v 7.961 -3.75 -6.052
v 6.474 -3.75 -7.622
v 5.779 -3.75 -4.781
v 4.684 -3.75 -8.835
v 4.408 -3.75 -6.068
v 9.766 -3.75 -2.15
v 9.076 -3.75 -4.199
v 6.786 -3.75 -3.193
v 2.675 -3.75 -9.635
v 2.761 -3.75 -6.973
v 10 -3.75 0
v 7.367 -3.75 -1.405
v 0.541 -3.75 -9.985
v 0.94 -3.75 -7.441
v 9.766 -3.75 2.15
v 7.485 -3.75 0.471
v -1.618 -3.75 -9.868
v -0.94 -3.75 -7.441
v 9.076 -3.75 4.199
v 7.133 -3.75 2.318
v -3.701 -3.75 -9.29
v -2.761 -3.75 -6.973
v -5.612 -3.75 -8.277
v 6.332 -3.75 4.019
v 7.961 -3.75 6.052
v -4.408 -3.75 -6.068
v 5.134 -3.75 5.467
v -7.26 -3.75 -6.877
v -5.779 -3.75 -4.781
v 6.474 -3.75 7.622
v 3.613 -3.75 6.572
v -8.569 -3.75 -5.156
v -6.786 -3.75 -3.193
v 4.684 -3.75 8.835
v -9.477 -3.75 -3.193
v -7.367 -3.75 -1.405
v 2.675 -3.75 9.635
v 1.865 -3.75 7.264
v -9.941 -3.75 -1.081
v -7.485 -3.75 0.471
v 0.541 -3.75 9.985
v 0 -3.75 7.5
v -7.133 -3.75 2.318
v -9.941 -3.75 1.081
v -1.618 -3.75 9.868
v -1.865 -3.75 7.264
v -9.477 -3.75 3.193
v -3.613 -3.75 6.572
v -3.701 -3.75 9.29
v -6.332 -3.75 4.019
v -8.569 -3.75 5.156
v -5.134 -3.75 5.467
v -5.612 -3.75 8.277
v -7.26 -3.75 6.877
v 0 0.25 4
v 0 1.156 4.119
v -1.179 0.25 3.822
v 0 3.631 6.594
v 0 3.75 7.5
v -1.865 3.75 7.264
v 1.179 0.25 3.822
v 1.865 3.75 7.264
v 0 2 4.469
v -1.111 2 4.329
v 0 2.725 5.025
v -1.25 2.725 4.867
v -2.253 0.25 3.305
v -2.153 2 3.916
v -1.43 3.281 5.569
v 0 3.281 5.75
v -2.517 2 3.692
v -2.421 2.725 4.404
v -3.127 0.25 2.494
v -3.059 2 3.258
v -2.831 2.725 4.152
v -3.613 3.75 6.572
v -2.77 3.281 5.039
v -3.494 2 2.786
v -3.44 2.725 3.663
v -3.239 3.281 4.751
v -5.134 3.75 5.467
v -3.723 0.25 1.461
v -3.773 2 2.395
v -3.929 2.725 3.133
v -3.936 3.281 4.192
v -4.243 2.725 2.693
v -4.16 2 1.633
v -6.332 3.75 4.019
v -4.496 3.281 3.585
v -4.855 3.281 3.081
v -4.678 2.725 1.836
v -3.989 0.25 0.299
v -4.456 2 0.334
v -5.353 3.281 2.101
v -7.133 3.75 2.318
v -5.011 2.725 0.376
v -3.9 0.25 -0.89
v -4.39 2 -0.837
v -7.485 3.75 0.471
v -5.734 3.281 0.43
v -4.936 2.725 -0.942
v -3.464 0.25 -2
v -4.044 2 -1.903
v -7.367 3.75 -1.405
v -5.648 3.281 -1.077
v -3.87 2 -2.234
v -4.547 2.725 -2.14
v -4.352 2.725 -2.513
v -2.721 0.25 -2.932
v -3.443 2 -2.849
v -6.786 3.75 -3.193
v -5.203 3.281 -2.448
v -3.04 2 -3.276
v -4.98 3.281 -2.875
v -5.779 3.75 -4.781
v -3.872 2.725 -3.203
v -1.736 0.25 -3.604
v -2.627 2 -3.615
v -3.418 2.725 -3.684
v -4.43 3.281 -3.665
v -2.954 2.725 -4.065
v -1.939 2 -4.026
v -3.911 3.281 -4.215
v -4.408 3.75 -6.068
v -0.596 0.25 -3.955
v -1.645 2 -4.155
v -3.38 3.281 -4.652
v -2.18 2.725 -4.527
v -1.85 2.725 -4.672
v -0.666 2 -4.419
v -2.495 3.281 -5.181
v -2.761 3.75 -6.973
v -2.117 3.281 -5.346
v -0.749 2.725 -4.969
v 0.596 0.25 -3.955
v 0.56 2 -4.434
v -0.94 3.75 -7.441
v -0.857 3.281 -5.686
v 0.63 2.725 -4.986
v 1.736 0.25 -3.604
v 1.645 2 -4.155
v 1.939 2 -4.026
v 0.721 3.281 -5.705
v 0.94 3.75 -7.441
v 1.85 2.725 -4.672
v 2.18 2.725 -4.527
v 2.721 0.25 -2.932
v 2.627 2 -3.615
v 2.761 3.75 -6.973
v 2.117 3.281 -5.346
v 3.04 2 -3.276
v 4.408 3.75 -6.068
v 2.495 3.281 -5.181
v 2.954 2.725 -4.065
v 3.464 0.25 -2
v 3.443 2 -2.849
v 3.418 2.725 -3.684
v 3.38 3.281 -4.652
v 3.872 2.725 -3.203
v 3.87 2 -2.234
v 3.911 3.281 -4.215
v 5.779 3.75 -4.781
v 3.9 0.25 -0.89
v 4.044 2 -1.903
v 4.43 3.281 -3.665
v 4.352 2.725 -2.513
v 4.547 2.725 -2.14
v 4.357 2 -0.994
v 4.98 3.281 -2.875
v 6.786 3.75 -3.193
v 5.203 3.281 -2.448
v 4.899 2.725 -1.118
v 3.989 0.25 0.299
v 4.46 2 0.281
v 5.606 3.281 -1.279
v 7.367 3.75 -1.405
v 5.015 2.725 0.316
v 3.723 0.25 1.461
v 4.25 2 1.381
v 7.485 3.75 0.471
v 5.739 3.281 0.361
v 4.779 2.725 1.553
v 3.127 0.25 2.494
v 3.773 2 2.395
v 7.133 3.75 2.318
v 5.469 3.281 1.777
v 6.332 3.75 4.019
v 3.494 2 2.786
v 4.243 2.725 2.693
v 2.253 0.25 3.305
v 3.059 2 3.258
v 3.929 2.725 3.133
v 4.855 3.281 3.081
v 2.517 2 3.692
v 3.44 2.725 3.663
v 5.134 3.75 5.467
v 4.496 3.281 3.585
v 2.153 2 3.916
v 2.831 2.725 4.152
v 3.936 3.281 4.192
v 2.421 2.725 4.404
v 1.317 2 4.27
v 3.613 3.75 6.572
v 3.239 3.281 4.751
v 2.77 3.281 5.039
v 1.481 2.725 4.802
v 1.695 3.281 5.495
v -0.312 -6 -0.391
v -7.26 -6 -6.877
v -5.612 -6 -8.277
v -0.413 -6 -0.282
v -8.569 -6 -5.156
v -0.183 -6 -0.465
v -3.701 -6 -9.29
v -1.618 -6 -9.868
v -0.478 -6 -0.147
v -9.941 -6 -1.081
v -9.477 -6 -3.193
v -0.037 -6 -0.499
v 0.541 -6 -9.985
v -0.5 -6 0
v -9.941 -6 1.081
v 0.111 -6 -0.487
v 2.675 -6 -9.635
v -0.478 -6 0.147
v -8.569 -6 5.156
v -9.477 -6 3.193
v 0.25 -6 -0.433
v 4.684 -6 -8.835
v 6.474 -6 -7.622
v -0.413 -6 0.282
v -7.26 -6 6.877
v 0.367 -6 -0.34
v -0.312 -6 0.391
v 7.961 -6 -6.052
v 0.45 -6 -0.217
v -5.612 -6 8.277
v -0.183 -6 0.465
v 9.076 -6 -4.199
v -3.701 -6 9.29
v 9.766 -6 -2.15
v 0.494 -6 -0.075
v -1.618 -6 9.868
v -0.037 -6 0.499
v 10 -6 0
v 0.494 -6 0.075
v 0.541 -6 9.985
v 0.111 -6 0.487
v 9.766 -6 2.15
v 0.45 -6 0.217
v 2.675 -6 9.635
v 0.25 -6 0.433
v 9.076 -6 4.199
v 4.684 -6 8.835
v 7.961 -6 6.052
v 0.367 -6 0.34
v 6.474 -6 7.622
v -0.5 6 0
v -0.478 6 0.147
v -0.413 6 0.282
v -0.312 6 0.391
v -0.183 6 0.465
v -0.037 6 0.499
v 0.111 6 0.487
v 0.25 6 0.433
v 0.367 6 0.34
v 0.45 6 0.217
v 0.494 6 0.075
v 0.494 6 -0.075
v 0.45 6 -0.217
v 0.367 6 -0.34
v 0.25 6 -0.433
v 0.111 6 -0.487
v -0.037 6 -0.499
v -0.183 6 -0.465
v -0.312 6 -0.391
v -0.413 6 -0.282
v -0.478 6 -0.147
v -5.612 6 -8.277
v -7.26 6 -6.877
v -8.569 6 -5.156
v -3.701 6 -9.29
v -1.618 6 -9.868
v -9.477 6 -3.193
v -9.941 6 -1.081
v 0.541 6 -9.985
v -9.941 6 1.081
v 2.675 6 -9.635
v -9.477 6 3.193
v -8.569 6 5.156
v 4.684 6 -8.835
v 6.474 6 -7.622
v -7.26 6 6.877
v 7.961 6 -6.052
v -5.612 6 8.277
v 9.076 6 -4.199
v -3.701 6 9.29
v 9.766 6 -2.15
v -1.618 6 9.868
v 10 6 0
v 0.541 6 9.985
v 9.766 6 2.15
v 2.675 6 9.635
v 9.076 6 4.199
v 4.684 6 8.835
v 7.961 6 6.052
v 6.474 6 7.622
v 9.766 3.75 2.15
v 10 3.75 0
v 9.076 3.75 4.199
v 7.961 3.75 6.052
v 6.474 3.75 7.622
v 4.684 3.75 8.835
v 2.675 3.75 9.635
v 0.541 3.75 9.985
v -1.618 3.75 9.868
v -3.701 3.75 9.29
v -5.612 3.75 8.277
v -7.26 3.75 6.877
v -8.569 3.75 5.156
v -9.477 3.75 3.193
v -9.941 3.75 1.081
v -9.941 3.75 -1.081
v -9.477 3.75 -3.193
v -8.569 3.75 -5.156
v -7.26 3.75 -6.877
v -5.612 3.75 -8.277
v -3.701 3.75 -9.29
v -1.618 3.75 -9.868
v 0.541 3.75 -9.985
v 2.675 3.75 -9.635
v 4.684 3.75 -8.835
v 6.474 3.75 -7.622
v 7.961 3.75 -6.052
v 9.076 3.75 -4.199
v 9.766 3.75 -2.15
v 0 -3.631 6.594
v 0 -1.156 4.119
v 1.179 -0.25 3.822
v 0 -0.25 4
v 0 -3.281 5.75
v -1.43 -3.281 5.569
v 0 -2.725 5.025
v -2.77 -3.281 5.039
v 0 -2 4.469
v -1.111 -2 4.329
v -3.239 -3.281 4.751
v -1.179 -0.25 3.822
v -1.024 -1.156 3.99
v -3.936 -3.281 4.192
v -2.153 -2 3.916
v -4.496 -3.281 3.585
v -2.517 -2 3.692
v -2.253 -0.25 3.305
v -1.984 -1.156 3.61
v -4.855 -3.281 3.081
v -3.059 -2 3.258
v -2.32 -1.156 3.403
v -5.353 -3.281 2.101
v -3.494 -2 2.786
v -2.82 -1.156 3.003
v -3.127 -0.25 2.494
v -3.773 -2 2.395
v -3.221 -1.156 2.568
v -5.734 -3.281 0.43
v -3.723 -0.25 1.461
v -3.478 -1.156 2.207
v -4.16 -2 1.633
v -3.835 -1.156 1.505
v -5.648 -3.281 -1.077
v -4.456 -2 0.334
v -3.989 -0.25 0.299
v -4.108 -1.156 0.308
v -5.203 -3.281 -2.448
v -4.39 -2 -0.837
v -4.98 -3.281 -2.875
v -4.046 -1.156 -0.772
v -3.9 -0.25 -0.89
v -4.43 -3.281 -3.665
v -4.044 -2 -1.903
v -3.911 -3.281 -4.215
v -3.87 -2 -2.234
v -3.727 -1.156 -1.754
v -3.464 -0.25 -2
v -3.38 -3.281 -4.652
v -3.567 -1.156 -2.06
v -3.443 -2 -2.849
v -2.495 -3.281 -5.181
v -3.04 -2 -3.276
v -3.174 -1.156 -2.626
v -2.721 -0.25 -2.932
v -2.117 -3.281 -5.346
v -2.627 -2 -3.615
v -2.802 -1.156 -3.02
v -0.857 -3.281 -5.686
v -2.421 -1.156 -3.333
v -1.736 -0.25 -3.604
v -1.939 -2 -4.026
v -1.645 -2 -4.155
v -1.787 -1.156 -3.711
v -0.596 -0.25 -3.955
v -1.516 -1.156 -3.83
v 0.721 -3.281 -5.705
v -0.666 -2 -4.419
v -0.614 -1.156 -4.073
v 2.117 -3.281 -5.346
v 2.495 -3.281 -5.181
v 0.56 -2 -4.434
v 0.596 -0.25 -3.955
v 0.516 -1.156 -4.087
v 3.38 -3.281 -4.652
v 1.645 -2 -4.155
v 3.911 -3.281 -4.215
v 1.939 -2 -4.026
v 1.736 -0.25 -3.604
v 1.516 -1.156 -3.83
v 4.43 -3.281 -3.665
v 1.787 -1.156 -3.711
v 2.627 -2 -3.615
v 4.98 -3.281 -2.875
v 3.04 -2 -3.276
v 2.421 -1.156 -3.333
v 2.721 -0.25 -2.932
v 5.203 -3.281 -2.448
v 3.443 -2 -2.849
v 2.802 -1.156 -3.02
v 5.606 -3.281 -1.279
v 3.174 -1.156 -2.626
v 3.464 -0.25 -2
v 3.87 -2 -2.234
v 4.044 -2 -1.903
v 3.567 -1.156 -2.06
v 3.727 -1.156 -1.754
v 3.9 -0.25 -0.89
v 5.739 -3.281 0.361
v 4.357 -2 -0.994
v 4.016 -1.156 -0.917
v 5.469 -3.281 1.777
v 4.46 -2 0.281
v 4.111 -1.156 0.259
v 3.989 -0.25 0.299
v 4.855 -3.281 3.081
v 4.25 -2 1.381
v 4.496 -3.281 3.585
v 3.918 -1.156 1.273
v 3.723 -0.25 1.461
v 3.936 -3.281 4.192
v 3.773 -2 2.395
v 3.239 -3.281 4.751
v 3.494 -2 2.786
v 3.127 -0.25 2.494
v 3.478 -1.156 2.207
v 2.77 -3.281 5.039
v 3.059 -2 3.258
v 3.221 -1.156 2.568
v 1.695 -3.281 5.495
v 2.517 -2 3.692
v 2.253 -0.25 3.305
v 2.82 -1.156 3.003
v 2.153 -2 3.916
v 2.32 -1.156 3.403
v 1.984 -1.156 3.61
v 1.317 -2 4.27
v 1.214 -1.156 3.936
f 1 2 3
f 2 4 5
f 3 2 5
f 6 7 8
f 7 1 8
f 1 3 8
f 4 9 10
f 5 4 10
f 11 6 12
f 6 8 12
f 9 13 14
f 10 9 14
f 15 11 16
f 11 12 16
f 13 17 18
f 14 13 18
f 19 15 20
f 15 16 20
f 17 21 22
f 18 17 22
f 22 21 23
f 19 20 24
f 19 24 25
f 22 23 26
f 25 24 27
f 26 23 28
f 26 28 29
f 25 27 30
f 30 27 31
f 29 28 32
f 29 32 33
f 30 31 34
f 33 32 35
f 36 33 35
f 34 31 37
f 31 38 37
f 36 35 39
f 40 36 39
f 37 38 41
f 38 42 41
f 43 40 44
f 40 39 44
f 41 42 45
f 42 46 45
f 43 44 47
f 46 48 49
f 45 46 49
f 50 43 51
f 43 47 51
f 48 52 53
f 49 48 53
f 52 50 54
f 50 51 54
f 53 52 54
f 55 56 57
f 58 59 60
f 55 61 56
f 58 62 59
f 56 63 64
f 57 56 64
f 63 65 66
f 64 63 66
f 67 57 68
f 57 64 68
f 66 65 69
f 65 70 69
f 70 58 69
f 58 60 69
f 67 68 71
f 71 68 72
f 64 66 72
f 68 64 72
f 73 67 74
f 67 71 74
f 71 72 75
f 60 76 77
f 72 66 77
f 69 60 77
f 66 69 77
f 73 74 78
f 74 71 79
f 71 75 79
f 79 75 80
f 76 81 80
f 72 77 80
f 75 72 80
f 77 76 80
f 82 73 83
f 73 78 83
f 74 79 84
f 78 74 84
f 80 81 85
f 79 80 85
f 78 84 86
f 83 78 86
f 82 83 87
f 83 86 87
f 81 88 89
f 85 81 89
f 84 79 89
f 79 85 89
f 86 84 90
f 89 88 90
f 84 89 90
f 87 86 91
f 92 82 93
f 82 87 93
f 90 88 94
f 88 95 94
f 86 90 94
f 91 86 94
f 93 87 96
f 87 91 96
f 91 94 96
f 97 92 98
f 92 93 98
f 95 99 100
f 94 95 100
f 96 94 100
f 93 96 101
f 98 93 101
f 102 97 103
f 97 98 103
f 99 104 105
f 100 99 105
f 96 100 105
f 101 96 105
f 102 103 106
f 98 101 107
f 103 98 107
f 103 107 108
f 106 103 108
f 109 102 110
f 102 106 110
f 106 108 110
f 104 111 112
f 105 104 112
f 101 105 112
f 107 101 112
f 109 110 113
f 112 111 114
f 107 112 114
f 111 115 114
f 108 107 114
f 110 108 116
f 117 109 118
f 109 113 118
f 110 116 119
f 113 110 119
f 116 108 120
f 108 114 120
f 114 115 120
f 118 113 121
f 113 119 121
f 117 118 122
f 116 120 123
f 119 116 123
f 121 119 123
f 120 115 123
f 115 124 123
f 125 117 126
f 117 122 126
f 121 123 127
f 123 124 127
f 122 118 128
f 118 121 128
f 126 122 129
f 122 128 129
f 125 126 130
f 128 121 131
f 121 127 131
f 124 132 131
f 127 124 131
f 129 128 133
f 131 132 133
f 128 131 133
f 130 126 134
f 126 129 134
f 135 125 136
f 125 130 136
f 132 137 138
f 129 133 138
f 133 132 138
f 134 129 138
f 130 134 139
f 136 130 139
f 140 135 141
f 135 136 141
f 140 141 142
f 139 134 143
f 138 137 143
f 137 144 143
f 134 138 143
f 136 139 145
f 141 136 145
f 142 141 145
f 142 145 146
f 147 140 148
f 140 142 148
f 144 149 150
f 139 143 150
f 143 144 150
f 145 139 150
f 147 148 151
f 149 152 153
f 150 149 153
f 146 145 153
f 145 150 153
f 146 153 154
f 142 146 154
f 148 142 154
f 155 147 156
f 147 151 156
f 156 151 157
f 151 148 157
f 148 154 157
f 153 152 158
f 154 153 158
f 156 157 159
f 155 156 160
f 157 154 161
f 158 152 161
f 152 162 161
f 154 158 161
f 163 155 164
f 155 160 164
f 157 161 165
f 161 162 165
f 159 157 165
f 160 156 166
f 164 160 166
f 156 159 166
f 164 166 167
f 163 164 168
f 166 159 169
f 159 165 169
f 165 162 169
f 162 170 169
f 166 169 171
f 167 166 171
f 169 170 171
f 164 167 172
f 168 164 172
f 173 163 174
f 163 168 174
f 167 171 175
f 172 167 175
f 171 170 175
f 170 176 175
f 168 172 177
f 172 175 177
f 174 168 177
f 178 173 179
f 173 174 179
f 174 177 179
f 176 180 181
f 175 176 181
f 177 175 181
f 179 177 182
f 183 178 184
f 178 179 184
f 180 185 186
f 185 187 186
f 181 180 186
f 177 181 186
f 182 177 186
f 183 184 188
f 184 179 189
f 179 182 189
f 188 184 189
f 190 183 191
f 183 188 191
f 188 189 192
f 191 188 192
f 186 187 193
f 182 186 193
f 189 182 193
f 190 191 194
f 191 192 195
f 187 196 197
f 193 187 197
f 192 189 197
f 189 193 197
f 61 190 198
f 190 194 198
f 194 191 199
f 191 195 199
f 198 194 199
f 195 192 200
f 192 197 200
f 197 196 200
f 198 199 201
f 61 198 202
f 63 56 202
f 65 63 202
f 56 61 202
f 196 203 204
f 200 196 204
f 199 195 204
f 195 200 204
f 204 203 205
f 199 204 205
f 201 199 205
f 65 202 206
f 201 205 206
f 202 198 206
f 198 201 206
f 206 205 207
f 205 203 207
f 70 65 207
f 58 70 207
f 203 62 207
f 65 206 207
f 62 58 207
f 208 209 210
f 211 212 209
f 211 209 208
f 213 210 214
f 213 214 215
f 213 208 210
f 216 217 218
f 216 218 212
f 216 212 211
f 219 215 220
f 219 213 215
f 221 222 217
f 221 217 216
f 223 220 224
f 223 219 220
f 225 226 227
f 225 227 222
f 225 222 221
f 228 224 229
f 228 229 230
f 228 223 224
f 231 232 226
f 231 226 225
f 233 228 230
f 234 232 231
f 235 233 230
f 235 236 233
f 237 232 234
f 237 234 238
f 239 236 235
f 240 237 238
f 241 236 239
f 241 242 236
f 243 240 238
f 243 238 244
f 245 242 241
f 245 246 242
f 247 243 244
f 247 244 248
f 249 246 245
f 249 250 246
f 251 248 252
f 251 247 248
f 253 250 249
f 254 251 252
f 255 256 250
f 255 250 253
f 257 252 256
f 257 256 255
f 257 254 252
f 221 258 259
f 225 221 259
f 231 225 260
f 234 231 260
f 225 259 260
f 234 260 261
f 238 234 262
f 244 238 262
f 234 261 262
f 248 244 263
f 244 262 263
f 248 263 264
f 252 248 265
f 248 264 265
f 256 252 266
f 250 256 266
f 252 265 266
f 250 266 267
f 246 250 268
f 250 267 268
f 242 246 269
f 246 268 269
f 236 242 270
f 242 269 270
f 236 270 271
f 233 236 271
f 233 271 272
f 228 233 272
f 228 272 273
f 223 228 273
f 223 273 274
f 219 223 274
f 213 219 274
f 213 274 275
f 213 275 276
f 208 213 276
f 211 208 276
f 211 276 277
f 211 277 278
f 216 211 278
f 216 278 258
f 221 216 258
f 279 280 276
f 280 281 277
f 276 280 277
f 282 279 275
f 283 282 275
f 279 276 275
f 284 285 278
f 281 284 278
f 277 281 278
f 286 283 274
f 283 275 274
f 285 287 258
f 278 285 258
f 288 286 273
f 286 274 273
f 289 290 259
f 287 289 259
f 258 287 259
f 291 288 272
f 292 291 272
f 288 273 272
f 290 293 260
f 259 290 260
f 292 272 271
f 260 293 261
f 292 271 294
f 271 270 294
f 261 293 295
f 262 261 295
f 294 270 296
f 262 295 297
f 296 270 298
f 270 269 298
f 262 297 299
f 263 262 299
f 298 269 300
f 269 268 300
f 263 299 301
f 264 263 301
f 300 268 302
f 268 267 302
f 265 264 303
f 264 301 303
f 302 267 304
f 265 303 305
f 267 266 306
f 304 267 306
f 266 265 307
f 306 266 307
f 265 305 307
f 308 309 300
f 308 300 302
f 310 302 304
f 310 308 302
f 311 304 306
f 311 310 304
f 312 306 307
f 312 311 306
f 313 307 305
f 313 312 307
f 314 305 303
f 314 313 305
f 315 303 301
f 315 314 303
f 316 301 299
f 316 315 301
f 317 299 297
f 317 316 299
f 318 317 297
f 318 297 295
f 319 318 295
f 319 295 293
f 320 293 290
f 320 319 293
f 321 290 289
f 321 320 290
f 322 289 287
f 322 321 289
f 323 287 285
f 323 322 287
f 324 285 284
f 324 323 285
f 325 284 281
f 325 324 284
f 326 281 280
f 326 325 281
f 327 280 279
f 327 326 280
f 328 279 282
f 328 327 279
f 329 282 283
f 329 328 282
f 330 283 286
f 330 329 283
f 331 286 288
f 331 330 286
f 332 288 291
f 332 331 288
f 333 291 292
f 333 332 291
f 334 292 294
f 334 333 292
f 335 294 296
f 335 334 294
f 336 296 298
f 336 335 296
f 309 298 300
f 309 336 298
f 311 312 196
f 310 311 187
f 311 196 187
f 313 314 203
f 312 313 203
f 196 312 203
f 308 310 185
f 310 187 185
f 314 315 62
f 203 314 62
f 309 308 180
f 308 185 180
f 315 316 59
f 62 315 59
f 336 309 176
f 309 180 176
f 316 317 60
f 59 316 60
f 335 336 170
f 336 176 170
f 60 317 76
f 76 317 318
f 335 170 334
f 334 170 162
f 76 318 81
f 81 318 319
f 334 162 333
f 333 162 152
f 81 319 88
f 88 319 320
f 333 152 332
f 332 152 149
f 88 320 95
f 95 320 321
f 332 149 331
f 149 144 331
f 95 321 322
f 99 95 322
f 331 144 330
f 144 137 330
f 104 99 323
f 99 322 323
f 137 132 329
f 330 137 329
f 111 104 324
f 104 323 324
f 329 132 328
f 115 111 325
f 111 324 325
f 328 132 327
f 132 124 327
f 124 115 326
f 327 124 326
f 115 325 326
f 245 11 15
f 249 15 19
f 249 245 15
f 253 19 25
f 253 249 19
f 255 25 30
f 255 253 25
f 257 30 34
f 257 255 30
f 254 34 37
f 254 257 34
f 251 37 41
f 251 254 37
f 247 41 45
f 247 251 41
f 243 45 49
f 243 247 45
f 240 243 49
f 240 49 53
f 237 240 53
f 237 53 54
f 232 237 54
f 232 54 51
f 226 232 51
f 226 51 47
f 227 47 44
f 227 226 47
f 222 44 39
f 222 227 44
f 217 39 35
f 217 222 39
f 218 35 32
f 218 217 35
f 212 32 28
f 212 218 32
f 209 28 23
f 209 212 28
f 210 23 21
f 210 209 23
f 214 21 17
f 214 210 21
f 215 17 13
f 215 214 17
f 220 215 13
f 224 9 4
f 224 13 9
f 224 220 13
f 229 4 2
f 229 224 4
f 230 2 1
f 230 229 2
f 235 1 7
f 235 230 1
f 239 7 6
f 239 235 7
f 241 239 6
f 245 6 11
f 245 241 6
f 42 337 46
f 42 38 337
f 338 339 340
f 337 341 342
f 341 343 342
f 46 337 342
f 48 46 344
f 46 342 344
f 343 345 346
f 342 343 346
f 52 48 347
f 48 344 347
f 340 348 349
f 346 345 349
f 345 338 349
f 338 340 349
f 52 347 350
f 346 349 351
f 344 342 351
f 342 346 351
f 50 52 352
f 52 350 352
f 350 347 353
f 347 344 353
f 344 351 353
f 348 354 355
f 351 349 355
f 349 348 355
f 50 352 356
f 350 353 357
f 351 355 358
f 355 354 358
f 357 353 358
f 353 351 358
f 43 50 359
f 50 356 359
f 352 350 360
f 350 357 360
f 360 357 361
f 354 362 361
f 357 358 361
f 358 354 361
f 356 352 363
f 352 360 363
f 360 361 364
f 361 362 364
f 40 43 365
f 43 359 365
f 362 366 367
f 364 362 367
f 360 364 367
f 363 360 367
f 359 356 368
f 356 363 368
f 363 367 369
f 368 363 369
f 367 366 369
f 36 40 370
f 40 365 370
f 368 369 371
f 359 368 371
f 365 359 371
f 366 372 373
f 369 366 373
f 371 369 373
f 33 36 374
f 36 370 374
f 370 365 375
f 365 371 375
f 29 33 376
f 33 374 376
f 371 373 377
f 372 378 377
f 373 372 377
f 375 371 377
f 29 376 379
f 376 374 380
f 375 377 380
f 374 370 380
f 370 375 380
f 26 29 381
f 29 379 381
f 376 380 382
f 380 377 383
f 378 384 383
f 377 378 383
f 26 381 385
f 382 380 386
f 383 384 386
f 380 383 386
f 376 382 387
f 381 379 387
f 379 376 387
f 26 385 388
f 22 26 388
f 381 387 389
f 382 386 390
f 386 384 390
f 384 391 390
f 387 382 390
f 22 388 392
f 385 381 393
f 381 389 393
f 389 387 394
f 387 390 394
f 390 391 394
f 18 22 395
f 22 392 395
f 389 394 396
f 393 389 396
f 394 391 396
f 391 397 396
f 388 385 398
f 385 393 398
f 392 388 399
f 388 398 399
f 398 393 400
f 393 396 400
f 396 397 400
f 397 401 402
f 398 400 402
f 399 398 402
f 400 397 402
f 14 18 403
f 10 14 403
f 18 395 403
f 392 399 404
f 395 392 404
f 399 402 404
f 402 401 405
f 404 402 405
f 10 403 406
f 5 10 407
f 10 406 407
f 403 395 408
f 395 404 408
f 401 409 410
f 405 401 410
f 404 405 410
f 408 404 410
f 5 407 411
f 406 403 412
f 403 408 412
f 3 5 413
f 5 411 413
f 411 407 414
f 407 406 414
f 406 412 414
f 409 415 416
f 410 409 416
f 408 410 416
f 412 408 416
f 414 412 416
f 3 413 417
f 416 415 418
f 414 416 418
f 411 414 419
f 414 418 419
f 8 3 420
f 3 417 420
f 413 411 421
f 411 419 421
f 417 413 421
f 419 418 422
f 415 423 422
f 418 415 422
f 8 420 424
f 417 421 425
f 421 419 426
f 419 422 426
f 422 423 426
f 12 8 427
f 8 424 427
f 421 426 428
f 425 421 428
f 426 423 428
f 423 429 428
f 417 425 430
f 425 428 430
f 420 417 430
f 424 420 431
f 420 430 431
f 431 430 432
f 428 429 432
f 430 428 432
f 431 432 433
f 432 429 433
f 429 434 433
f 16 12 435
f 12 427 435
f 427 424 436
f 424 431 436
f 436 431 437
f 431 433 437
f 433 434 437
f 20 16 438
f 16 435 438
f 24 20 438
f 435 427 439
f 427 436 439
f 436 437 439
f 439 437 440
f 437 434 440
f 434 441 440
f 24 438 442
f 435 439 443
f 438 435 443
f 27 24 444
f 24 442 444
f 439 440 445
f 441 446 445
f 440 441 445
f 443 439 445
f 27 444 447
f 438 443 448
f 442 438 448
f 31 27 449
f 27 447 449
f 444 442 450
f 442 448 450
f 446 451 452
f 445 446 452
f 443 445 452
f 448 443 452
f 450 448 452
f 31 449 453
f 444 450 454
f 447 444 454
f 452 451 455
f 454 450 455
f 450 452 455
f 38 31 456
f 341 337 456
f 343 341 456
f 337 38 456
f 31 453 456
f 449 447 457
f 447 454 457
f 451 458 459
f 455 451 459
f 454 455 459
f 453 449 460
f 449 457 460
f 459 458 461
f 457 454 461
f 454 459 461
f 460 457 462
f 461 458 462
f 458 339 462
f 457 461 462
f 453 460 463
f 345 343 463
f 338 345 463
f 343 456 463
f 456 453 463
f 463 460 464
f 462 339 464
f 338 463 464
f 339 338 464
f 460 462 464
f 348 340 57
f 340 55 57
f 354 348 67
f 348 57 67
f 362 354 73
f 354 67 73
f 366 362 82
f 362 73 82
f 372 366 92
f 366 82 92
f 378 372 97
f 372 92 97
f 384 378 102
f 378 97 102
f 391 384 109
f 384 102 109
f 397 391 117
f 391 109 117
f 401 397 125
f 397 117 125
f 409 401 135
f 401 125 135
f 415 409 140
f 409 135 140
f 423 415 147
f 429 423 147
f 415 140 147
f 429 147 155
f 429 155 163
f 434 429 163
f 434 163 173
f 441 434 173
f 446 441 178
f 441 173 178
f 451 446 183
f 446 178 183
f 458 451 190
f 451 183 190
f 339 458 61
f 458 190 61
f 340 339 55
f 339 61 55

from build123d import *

# Parameters (mm, degrees)
F0_R     = 10
F1_DEPTH = 6
F5_R     = 0.5
F6_DEPTH = 12.001


with BuildPart() as f1:
    # F0 (on Front) → F1 (new body, symmetric)
    with BuildSketch(Plane.XZ):
        Circle(F0_R)
    extrude(amount=F1_DEPTH, both=True)

    # F3 (on Right) → F4 (revolve, cut)
    with BuildSketch(Plane.YZ):
        with BuildLine():
            Line((3.75, 10), (-3.75, 10))
            Line((-3.75, 10), (-3.75, 7.5))
            ThreePointArc((-3.75, 7.5), (-2.724874, 5.025126), (-0.25, 4))
            Line((-0.25, 4), (0.25, 4))
            ThreePointArc((0.25, 4), (2.724874, 5.025126), (3.75, 7.5))
            Line((3.75, 7.5), (3.75, 10))
        make_face()
    revolve(axis=Axis((0, -0.154715, 0), (0, -1, 0)), mode=Mode.SUBTRACT)

    # F5 (on face) → F6 (cut, through all)
    with BuildSketch(Plane(origin=(0, 6, 0), x_dir=(-1, 0, 0), z_dir=(0, 1, 0))):
        Circle(F5_R)
    extrude(amount=-F6_DEPTH, mode=Mode.SUBTRACT)


solid = f1.part
